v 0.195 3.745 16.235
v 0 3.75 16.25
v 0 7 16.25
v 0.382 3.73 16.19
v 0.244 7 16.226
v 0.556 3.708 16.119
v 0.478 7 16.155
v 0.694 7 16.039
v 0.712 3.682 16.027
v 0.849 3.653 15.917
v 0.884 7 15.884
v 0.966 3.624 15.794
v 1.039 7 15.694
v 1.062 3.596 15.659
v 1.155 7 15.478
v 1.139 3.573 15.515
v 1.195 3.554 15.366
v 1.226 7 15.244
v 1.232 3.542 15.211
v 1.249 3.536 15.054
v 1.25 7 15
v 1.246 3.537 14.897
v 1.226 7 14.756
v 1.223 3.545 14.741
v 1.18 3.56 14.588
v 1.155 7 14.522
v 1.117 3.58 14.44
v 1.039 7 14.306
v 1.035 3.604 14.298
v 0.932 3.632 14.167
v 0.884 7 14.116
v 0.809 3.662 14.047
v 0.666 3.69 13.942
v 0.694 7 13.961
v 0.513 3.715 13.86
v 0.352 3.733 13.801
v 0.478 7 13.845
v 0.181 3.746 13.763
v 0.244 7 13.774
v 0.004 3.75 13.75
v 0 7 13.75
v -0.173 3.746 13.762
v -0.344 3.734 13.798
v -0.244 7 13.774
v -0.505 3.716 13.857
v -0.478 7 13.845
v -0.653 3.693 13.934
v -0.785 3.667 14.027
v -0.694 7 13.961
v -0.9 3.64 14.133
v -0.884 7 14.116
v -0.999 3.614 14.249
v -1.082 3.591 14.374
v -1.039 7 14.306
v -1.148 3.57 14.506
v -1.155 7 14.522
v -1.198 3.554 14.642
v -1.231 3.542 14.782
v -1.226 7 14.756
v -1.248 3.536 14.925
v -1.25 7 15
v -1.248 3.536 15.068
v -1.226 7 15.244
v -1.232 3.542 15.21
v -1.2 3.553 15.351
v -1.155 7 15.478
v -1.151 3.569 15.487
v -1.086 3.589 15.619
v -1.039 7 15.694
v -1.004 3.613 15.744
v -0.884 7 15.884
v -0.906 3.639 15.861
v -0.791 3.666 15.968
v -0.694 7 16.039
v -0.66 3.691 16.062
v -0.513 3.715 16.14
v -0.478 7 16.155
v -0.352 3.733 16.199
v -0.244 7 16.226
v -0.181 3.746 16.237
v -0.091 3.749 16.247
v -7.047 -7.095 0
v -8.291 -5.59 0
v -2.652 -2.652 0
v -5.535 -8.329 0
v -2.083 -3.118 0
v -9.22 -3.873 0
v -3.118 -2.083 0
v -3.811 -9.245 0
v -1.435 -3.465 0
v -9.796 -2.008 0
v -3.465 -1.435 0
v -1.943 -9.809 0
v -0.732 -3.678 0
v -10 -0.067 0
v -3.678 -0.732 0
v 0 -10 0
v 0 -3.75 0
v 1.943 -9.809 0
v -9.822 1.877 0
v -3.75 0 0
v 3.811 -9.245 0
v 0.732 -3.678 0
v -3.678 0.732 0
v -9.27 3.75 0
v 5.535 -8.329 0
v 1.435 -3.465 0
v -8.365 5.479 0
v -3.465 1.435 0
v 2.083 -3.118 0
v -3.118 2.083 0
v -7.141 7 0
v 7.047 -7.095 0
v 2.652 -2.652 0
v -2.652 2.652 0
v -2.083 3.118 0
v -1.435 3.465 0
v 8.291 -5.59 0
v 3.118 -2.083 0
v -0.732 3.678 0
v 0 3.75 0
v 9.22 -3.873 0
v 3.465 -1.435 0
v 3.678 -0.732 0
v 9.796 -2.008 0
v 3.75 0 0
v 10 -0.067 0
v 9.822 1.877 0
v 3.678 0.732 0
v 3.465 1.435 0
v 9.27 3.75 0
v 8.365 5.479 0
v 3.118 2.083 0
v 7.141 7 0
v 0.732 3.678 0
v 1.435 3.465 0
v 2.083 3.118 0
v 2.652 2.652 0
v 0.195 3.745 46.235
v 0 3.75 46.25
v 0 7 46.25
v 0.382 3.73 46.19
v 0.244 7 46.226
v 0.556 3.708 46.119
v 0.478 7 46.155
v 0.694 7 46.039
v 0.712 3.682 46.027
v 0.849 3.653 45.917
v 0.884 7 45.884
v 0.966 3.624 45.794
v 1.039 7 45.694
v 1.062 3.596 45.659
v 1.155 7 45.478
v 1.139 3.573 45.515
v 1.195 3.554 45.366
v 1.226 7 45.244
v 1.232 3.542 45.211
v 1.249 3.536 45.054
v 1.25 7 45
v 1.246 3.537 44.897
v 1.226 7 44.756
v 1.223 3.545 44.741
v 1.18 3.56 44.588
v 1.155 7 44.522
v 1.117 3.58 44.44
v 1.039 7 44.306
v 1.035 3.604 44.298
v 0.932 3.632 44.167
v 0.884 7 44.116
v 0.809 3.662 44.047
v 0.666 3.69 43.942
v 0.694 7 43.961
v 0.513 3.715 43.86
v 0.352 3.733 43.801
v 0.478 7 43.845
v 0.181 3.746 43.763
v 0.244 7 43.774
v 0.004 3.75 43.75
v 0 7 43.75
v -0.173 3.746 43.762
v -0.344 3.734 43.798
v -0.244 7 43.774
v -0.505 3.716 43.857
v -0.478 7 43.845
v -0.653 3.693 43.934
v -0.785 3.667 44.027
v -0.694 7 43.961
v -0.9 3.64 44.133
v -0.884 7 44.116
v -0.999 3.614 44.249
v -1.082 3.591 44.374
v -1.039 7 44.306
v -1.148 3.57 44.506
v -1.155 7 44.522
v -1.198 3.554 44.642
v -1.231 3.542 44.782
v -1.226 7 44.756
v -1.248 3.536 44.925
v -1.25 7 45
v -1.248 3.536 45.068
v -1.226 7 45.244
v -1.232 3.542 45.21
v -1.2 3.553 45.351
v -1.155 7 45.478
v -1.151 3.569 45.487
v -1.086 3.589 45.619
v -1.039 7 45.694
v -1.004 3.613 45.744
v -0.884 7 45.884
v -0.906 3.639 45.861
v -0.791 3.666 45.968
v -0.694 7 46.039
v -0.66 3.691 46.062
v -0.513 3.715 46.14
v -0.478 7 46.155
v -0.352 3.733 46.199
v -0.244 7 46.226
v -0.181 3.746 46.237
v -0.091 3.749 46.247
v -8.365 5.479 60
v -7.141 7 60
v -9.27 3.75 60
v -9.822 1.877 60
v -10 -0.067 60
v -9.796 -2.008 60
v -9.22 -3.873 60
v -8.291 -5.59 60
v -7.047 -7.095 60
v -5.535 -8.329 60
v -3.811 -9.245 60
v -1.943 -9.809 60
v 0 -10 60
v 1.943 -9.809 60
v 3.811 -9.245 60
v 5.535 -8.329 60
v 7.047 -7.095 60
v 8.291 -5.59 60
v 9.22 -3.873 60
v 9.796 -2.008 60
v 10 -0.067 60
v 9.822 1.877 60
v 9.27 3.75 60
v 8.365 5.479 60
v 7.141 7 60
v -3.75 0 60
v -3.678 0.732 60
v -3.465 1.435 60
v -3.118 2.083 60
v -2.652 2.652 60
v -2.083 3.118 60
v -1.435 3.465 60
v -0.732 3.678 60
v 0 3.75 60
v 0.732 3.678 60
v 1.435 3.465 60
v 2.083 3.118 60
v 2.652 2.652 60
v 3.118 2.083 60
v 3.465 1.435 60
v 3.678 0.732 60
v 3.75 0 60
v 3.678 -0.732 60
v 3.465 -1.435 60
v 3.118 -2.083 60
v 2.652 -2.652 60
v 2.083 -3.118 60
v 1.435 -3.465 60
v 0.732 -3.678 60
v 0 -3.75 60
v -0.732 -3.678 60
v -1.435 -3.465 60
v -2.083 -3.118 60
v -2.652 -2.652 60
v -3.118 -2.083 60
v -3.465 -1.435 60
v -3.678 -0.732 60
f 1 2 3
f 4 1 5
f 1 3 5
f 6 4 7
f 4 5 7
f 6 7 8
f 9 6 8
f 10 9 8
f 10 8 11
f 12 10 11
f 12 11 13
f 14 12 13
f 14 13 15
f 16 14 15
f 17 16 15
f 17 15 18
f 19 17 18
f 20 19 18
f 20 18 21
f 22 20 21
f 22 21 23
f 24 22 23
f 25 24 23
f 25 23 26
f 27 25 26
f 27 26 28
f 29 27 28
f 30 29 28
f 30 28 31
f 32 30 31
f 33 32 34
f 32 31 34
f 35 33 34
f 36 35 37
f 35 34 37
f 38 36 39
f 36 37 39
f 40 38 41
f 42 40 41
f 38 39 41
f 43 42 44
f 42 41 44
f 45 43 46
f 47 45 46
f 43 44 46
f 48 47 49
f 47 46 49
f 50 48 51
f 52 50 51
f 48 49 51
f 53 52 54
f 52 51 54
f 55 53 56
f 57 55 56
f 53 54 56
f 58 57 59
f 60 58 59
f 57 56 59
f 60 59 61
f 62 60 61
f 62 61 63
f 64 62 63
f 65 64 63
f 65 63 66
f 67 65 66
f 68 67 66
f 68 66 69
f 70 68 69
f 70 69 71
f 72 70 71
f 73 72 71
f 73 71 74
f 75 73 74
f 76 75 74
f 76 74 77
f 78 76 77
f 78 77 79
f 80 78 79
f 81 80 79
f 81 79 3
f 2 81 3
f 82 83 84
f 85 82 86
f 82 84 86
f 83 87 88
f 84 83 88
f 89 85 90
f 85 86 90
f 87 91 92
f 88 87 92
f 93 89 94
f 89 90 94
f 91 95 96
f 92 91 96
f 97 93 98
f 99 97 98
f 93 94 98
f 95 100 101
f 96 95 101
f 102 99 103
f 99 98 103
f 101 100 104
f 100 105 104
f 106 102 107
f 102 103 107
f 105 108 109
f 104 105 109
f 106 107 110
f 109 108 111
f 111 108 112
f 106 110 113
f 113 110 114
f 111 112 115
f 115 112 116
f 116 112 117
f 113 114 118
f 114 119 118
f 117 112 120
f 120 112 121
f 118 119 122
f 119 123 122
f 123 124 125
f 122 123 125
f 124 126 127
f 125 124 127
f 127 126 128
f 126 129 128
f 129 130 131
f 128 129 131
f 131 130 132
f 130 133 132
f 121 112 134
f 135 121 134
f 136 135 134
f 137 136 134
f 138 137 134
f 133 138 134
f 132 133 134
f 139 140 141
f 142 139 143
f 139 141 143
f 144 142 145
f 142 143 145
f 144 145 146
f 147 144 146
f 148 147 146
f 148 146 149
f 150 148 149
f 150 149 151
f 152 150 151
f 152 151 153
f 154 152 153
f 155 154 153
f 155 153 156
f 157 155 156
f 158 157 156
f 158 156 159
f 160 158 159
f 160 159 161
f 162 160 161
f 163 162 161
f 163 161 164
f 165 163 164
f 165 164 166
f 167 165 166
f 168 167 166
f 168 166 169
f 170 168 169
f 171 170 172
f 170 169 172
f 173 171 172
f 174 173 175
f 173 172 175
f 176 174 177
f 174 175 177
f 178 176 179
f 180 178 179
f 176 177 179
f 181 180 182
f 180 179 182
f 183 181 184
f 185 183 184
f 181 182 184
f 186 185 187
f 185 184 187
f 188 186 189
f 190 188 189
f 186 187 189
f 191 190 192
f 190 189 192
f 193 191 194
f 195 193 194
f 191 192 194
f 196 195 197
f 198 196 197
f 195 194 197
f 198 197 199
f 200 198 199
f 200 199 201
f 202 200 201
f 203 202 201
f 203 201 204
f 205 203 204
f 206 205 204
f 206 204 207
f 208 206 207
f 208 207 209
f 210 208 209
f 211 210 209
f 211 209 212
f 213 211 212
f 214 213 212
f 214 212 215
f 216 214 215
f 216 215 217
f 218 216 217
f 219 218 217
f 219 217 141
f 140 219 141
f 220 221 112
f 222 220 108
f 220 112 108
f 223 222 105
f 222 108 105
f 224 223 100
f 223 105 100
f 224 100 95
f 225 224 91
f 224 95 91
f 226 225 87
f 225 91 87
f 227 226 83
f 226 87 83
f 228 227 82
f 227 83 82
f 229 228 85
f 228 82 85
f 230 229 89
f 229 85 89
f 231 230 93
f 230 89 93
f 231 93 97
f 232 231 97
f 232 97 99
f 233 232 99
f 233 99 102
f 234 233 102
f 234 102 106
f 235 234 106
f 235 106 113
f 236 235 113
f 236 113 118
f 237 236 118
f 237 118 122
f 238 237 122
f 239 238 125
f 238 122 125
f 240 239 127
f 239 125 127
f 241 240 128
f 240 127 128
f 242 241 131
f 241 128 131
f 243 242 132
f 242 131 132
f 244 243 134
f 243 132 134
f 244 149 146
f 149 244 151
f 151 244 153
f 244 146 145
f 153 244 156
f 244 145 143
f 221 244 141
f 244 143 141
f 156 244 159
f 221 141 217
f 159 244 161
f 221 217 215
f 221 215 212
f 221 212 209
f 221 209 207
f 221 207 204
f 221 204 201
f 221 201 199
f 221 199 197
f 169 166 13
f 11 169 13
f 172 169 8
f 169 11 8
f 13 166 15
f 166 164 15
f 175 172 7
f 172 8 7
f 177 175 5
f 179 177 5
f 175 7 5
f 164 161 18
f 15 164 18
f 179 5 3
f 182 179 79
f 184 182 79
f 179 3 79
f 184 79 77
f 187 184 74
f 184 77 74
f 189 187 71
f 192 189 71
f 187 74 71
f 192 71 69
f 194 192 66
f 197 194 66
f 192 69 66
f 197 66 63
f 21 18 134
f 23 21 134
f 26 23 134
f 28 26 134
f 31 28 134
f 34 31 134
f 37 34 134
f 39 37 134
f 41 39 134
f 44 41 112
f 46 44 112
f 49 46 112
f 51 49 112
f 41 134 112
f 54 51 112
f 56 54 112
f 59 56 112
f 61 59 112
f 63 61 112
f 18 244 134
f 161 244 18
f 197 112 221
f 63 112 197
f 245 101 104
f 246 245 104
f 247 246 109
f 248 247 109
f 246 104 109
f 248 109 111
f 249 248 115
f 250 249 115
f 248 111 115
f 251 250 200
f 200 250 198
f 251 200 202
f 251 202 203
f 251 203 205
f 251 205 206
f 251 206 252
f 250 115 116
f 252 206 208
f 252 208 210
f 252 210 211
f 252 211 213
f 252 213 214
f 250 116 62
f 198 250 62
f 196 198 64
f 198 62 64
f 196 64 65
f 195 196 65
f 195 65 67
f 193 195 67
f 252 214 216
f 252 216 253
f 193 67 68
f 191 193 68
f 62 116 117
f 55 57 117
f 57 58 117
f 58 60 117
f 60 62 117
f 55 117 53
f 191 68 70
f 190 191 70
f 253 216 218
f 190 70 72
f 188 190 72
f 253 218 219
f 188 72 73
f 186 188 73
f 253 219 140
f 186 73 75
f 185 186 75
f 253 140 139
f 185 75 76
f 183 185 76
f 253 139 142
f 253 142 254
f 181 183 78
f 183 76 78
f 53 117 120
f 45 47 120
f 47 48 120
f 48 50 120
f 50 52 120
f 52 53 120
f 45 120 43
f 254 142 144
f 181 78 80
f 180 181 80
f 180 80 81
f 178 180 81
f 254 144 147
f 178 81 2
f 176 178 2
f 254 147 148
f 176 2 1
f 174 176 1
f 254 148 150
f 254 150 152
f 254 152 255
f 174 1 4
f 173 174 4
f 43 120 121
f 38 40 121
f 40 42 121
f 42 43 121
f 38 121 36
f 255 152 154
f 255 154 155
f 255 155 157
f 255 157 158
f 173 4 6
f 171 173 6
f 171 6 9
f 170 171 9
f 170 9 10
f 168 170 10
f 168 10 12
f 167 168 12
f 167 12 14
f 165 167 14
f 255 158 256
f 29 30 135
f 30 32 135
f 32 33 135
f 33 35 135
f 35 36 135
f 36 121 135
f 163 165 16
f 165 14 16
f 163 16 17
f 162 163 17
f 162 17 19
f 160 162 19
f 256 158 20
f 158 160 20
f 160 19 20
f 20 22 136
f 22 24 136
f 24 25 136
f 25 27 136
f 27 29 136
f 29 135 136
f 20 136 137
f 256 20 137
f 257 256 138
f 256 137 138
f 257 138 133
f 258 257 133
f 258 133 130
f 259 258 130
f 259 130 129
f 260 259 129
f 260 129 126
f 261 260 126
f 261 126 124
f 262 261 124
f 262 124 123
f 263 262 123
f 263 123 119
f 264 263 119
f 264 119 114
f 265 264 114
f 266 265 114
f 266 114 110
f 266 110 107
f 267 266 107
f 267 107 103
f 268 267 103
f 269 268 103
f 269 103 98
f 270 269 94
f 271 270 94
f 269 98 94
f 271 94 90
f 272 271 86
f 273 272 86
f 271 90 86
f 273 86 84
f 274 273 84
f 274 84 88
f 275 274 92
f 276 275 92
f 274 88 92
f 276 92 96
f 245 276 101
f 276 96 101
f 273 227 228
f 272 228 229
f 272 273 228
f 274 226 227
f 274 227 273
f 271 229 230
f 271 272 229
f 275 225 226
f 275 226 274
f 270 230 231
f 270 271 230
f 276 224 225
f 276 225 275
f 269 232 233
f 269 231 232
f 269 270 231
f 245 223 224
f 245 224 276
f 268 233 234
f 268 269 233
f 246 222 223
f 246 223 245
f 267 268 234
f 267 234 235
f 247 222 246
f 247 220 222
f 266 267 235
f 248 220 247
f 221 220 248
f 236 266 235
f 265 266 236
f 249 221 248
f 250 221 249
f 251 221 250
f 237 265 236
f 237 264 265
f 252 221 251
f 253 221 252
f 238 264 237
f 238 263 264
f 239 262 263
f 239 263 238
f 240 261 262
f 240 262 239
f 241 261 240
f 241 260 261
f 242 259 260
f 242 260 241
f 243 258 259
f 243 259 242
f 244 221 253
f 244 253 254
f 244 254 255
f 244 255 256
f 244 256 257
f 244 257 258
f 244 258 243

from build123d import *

# Parameters (mm, degrees)
SKETCH1_R               = 10
BOSS_EXTRUDE1_DEPTH     = 60
CUT_EXTRUDE1_REACH      = 63.644
SKETCH2_R               = 3.75
CUT_EXTRUDE2_REACH      = 65.159
CUT_EXTRUDE2_END_RADIUS = 3.75
SKETCH3_R               = 1.25


with BuildPart() as part:
    # Sketch1 → Boss-Extrude1 (new body)
    with BuildSketch(Plane.XY):
        Circle(SKETCH1_R)
    extrude(amount=BOSS_EXTRUDE1_DEPTH)

    # Sketch2 → Cut-Extrude1 (cut, up to next)
    with BuildSketch(Plane(origin=(0, 0, 0), x_dir=(-1, 0, 0), z_dir=(0, 0, -1)), mode=Mode.PRIVATE) as cut_extrude1_sk1:
        Circle(SKETCH2_R)
    cut_extrude1_tool1 = extrude(cut_extrude1_sk1.sketch, amount=-CUT_EXTRUDE1_REACH, mode=Mode.PRIVATE) & part.part
    # Sketch2 → Cut-Extrude1 (cut, up to next)
    with BuildSketch(Plane(origin=(0, 0, 0), x_dir=(-1, 0, 0), z_dir=(0, 0, -1)), mode=Mode.PRIVATE) as cut_extrude1_sk2:
        with BuildLine():
            Line((-7.141428429, 7), (7.141428429, 7))
            ThreePointArc((7.141428429, 7), (0, 10), (-7.141428429, 7))
        make_face()
    cut_extrude1_tool2 = extrude(cut_extrude1_sk2.sketch, amount=-CUT_EXTRUDE1_REACH, mode=Mode.PRIVATE) & part.part
    add(cut_extrude1_tool1.solids().sort_by_distance((0, 0, 0))[0], mode=Mode.SUBTRACT)
    add(cut_extrude1_tool2.solids().sort_by_distance((0, 8.216904, 0))[0], mode=Mode.SUBTRACT)

    # Cut-Extrude2: up to this cylinder (the profile starts outside it)
    cut_extrude2_end = Plane(origin=(0, 0, 30), z_dir=(0, 0, -1)) * Cylinder(CUT_EXTRUDE2_END_RADIUS, 168.818, mode=Mode.PRIVATE)
    # Sketch3 → Cut-Extrude2 (cut, up to the surface)
    with BuildSketch(Plane(origin=(0, 7, 0), x_dir=(1, 0, 0), z_dir=(0, 1, 0)), mode=Mode.PRIVATE) as cut_extrude2_sk1:
        with Locations(Location((0, -15, 0), (0, 0, 270))):
            Circle(SKETCH3_R)
    cut_extrude2_tool1 = extrude(cut_extrude2_sk1.sketch, amount=-CUT_EXTRUDE2_REACH, mode=Mode.PRIVATE) - cut_extrude2_end
    add(cut_extrude2_tool1.solids().sort_by_distance((0, 7, 15))[0], mode=Mode.SUBTRACT)
    # Sketch3 → Cut-Extrude2 (cut, up to the surface)
    with BuildSketch(Plane(origin=(0, 7, 0), x_dir=(1, 0, 0), z_dir=(0, 1, 0)), mode=Mode.PRIVATE) as cut_extrude2_sk2:
        with Locations(Location((0, -45, 0), (0, 0, 270))):
            Circle(SKETCH3_R)
    cut_extrude2_tool2 = extrude(cut_extrude2_sk2.sketch, amount=-CUT_EXTRUDE2_REACH, mode=Mode.PRIVATE) - cut_extrude2_end
    add(cut_extrude2_tool2.solids().sort_by_distance((0, 7, 45))[0], mode=Mode.SUBTRACT)


solid = part.part
